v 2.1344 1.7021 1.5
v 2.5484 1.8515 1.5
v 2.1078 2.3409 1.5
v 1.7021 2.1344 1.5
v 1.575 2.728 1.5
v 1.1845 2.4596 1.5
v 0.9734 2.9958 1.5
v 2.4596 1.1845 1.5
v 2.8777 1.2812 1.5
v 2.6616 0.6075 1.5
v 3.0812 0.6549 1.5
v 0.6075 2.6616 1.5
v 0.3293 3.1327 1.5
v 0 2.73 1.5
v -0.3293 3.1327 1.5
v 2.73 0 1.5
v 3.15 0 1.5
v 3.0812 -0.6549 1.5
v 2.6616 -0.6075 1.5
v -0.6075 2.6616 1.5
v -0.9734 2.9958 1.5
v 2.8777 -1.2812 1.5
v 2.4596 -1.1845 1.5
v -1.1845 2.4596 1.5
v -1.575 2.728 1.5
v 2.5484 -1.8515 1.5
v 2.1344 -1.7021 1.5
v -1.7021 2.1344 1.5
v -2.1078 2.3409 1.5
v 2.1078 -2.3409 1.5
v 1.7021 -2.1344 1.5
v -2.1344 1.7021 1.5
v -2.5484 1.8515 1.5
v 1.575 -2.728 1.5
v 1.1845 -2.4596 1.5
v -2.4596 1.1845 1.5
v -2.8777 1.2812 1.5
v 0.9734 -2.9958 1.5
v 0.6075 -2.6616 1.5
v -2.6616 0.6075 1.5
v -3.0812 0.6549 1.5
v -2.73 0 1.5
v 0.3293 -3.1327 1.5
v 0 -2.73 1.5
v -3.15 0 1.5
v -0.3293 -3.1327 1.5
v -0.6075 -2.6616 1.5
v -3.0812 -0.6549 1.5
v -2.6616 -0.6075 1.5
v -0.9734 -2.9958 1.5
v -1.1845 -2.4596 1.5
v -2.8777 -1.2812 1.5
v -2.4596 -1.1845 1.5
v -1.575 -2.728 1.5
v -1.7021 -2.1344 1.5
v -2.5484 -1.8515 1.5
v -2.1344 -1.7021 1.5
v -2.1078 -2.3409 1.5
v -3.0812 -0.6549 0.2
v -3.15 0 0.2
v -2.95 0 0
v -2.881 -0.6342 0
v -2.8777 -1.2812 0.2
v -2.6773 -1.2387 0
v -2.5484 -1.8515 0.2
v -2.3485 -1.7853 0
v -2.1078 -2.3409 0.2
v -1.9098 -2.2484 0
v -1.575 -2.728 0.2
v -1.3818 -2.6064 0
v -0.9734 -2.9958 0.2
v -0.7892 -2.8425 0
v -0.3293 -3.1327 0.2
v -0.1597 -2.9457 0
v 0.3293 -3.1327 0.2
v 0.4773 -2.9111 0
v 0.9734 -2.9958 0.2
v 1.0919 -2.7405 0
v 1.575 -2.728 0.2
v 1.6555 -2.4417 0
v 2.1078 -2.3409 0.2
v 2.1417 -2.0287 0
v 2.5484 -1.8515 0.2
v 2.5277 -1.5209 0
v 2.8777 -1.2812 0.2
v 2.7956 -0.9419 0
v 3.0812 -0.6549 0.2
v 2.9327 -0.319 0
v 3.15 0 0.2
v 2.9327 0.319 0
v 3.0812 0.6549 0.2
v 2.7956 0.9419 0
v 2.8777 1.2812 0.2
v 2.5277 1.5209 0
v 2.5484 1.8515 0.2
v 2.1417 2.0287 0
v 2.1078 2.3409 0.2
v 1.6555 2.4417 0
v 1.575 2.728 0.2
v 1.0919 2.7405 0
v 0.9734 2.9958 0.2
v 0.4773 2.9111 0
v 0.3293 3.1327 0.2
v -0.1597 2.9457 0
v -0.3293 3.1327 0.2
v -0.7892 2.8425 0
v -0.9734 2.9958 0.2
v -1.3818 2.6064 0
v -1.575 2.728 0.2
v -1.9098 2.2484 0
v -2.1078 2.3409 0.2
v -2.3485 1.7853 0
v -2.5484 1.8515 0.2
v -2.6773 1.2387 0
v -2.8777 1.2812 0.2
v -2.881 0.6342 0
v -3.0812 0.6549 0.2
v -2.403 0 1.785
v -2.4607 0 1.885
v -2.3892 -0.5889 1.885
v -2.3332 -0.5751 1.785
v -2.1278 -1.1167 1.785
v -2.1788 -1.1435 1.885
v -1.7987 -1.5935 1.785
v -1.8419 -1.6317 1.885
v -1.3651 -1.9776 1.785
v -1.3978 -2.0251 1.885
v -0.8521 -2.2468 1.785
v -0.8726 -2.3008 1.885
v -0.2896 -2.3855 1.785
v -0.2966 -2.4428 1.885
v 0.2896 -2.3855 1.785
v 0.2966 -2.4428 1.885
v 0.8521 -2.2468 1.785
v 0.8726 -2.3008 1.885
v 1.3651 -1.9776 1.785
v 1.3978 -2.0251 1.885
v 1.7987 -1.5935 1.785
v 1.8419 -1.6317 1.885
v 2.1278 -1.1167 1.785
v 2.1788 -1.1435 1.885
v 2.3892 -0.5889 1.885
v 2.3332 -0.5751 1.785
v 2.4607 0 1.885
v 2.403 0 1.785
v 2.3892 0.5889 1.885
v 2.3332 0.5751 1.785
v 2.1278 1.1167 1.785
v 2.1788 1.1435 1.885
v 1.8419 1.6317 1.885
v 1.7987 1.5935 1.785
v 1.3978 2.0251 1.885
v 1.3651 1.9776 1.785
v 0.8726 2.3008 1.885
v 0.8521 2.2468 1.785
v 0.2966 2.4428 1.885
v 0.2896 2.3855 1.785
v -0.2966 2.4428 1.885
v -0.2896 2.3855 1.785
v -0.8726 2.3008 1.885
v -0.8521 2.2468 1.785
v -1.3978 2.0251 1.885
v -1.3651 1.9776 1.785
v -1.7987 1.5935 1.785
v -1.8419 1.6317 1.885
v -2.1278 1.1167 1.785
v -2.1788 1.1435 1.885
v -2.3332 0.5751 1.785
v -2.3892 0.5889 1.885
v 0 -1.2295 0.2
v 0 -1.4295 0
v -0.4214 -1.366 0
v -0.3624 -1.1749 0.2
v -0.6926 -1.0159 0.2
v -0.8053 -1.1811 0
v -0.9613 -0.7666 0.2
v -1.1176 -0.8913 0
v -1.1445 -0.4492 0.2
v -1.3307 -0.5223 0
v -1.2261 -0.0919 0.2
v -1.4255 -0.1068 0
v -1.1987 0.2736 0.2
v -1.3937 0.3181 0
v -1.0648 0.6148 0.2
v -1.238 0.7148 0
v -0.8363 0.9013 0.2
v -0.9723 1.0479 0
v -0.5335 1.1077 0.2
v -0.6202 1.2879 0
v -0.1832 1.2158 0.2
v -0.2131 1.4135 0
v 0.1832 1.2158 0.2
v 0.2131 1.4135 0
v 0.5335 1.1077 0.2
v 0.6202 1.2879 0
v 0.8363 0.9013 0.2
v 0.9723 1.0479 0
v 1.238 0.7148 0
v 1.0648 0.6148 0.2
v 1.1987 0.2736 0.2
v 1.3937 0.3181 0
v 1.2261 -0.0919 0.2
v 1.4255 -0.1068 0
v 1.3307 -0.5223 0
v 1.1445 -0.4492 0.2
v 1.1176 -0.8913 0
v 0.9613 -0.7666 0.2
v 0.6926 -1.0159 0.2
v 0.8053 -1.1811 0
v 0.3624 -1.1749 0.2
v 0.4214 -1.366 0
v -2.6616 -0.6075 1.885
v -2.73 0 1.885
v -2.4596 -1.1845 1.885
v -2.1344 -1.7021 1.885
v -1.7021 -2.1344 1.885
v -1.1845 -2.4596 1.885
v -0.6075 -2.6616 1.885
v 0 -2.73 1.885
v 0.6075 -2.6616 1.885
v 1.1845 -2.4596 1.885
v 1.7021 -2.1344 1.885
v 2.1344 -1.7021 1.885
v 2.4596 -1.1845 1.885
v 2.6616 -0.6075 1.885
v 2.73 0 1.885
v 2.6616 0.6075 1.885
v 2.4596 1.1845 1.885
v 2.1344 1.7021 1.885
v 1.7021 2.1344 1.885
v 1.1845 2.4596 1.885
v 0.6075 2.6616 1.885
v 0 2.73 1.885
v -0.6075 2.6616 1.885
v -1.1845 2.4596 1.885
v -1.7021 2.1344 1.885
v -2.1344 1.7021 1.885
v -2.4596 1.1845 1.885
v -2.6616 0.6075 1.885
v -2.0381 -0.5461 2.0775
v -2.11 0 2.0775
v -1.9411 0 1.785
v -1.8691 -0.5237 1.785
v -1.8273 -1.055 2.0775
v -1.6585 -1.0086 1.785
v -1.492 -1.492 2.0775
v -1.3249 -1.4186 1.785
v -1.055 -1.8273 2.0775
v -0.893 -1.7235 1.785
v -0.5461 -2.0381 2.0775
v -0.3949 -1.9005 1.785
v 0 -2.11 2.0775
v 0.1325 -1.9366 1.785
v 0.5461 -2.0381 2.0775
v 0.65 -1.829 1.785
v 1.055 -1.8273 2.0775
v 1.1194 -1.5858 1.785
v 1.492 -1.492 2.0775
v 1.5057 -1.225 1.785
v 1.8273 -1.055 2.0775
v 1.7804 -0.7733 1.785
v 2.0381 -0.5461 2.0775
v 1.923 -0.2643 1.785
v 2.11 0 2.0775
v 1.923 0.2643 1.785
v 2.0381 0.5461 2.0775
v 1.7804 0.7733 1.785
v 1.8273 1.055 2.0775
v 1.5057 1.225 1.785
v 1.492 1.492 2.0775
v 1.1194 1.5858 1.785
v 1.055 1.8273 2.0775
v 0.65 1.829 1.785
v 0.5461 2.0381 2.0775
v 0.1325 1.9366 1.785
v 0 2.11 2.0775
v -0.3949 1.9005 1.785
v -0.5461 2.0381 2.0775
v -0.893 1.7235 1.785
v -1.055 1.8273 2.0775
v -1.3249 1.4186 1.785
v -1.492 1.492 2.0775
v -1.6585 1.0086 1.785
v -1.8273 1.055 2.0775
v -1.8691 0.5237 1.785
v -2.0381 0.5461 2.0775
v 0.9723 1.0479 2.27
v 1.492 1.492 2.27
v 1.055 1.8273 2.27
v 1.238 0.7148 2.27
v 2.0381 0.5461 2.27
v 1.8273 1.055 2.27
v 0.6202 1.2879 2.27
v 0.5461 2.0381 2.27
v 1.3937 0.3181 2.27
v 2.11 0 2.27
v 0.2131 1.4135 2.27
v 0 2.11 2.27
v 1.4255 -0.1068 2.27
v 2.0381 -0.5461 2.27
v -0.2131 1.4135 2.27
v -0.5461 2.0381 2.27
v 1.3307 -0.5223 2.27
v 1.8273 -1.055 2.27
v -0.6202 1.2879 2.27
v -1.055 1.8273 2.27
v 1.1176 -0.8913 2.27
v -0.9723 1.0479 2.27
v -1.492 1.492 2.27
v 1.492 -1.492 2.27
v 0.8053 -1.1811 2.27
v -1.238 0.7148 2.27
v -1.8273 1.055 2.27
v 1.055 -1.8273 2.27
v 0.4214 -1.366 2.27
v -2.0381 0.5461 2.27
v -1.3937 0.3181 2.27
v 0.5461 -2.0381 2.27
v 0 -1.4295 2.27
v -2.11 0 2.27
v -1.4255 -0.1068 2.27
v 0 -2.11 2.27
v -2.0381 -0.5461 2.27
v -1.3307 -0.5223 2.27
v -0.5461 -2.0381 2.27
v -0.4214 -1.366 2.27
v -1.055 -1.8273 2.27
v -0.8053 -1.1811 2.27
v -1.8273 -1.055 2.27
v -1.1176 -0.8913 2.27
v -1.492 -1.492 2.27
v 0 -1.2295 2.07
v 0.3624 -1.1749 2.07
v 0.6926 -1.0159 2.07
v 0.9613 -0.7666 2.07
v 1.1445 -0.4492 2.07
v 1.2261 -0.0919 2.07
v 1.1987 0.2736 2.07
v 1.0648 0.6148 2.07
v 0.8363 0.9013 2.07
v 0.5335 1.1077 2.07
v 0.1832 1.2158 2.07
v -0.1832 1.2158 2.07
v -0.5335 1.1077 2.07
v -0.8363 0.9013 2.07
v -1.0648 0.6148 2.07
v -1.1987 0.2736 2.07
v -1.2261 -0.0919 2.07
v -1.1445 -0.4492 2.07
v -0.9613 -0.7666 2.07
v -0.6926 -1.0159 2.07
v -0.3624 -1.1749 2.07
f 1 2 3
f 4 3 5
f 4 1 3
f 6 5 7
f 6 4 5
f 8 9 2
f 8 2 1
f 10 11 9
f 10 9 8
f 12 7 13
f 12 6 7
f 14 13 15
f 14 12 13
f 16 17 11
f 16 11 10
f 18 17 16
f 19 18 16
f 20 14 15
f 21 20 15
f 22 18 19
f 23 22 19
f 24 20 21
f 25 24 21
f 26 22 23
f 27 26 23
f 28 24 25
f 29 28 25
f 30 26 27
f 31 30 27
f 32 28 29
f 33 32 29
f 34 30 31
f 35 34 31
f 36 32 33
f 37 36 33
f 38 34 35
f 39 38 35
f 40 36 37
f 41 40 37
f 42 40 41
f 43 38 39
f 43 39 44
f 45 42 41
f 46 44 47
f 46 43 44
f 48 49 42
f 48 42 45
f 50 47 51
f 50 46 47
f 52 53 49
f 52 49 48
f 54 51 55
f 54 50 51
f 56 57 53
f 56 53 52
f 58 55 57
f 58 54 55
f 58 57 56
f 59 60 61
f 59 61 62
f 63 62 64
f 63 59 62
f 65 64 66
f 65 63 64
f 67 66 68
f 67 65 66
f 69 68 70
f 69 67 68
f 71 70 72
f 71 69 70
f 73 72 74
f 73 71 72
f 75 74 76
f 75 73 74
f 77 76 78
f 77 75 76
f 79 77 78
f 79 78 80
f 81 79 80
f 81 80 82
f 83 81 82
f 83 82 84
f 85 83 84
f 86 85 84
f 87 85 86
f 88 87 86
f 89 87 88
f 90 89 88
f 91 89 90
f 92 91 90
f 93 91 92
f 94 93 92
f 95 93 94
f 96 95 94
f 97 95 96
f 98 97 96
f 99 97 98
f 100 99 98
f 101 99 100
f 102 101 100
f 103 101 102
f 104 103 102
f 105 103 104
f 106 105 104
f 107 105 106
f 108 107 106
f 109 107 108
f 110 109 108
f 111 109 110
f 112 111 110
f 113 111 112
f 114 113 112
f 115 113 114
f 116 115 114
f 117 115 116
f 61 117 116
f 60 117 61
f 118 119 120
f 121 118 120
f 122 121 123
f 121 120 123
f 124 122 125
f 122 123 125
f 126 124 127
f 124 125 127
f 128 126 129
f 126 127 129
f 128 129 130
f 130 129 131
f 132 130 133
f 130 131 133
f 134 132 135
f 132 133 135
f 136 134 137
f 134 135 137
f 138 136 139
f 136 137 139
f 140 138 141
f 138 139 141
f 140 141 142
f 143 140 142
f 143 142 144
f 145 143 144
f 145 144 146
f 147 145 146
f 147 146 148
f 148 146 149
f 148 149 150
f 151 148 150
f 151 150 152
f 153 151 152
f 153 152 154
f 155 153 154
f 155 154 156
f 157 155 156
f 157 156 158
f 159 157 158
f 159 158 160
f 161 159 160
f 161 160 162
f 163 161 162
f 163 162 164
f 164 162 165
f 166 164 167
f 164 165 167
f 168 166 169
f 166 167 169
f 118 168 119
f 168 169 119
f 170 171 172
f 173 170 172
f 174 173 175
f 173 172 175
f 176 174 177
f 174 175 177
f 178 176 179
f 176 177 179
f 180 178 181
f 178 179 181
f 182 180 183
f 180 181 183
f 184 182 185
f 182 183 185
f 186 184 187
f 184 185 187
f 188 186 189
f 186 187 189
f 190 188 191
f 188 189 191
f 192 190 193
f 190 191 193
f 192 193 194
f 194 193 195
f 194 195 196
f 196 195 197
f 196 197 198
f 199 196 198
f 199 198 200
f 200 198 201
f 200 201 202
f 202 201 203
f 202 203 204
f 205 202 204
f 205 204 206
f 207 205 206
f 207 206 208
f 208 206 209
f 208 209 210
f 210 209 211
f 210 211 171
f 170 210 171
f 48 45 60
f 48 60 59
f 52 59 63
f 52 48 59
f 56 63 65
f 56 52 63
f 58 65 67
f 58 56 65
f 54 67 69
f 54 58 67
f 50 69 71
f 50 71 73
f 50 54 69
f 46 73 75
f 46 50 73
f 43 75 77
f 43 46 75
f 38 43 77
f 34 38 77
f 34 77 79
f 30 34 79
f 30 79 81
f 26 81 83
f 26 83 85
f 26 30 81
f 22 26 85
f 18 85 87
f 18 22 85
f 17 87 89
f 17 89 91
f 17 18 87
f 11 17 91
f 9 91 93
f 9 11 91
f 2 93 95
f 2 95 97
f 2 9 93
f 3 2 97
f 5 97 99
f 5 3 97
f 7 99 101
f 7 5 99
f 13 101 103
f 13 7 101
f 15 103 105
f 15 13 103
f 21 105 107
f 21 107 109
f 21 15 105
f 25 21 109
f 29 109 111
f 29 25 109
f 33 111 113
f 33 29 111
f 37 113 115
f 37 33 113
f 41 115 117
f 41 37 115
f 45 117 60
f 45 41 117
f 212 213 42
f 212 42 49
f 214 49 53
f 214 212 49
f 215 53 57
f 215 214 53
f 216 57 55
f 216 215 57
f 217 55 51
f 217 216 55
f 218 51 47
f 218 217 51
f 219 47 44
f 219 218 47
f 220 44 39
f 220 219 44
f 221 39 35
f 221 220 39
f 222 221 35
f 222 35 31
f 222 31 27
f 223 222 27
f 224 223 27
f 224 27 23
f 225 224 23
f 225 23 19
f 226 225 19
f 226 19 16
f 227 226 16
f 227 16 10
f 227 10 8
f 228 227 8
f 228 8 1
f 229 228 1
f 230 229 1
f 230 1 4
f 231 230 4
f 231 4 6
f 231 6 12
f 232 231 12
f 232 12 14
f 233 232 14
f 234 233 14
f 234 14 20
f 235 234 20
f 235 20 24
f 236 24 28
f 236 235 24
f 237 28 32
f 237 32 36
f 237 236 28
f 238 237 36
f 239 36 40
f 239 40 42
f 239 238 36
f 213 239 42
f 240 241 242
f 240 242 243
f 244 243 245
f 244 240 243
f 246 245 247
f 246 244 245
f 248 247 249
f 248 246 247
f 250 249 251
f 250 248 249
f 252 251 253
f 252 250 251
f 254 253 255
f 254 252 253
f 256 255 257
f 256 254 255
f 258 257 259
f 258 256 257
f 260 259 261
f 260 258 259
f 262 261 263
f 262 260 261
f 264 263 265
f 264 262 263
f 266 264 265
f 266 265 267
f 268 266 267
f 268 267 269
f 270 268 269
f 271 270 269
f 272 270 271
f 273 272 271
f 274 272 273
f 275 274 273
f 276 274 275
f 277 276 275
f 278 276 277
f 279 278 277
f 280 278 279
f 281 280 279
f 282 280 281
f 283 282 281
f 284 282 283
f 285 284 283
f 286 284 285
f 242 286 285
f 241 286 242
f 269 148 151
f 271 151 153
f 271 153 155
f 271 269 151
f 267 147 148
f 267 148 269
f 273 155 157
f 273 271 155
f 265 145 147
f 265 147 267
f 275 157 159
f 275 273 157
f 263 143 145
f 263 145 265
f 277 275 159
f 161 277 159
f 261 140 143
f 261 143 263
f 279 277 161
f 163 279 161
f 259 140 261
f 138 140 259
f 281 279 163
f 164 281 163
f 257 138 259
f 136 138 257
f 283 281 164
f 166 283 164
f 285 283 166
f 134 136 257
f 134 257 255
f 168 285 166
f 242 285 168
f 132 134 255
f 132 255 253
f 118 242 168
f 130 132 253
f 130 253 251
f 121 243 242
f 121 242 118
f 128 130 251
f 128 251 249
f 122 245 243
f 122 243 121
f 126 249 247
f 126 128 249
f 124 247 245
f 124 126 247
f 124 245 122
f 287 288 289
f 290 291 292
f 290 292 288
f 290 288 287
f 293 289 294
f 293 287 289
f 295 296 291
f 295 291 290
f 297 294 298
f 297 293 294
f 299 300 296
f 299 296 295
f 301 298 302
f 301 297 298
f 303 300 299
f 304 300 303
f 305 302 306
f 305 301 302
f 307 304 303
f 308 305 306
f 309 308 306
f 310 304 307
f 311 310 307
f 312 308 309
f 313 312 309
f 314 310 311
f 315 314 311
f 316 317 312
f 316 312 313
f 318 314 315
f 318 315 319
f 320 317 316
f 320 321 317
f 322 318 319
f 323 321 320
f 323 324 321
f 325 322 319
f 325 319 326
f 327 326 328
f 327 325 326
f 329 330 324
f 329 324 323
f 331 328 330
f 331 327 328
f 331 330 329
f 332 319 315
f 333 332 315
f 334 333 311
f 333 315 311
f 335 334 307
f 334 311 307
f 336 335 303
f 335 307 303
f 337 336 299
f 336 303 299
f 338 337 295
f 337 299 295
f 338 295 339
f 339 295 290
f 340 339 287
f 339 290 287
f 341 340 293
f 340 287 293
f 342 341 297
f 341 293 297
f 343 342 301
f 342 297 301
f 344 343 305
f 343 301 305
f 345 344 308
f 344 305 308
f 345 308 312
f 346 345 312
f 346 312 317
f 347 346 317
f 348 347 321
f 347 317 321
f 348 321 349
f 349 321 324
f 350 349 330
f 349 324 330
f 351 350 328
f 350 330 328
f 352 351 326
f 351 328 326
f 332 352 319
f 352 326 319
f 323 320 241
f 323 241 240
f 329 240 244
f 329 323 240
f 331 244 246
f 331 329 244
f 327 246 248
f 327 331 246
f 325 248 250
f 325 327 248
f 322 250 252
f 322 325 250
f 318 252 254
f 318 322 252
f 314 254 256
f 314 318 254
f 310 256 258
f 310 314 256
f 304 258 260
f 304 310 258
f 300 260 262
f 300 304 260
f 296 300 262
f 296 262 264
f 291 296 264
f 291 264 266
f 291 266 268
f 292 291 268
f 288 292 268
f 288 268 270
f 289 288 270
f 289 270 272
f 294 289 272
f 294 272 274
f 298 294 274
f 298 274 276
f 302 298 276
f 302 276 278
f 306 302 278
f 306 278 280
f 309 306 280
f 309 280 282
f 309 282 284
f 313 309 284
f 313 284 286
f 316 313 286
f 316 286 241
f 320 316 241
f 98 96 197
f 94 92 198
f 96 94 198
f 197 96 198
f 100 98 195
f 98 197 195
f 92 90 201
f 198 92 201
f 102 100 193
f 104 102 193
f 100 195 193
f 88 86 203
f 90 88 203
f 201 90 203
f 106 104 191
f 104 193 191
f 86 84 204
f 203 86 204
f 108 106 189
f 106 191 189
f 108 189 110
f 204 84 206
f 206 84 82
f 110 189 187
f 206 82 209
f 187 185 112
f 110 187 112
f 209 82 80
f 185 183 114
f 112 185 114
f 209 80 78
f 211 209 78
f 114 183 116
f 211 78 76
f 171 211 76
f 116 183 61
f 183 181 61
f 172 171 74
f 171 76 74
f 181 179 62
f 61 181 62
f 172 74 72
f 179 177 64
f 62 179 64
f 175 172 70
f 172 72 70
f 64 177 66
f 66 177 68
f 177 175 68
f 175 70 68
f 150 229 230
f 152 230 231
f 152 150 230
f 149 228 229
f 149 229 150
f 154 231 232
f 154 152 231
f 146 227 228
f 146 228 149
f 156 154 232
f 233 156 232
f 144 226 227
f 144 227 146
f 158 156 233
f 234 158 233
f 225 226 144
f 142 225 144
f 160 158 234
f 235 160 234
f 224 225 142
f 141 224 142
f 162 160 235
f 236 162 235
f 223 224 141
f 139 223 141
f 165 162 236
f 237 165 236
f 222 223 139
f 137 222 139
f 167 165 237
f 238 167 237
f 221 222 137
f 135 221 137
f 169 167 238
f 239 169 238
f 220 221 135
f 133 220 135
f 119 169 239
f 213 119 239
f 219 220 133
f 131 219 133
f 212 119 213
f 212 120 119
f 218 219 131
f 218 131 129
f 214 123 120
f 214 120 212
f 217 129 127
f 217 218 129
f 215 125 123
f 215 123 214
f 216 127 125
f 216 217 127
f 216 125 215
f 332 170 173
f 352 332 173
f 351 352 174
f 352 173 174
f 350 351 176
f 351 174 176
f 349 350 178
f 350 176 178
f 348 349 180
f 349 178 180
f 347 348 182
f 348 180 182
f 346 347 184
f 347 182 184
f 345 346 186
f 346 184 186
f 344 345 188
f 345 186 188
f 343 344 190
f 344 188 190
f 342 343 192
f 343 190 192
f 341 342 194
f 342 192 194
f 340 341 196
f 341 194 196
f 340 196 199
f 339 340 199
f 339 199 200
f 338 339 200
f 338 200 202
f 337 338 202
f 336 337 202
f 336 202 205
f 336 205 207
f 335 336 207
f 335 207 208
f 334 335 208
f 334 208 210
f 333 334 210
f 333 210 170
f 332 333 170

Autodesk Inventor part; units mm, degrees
ref_plane "YZ Plane" through (0, 0, 0) normal (1, 0, 0) x (0, 1, 0)
ref_plane "XZ Plane" through (0, 0, 0) normal (0, 1, 0) x (-1, 0, 0)
ref_plane "XY Plane" through (0, 0, 0) normal (0, 0, 1) x (1, 0, 0)
sketch "Sketch2" plane through (0, 0, 0) normal (0, 1, 0) x (-1, 0, 0)
  line L0 (0, 0) -> (0, 2.27)
  line L1 (0, 0) -> (3.15, 0)
  line L2 (3.15, 0) -> (3.15, 1.5)
  line L3 (3.15, 1.5) -> (2.73, 1.5)
  line L4 (2.73, 1.5) -> (2.73, 1.885)
  line L5 (2.73, 1.885) -> (2.4607, 1.885)
  line L6 (2.11, 2.0775) -> (2.11, 2.27)
  line L7 (2.11, 2.27) -> (0, 2.27)
  line L8 (2.11, 2.0775) -> (1.9411, 1.785)
  line L9 (1.9411, 1.785) -> (2.403, 1.785)
  line L10 (2.403, 1.785) -> (2.4607, 1.885)
  dimension "d0" = 1.5
  dimension "d1" = 0.77
  dimension "d2" = 4.22
  dimension "d3" = 6.3
  dimension "d17" = 0.385
  dimension "d18" = 5.46
  dimension "d19" = 0.1925
  dimension "d20" = 30
  dimension "d21" = 0.1
  dimension "d23" = 0.4
revolve "Obrót1" add sketch "Sketch2" angle 360 about axis through (0, 0, 0) along (0, 0, 1)
hole "Otwór1" at (0, 0, 2.27) direction (0, 0, -1) diameter 2.459 end through all thread size "M3x0.5" class "6H" standard "ANSI Metric M Profile"
chamfer "Faza1" distance 0.2 angle 45 3 edges at (0, 1.2295, 0) (3.15, 0, 0) (0, 1.2295, 2.27)
equation "\"d14\" = C1"
equation "\"d0\" = T_"
equation "\"d1\" = A_"
equation "\"d2\" = C_"
equation "\"d3\" = E_"
equation "\"d17\" = 0.5 * A_"
equation "\"d19\" = 0.25 * A_"
equation "\"A_\" = 0.77"
equation "\"C_\" = 4.22"
equation "\"E_\" = 6.3"
equation "\"T_\" = 1.5"
equation "\"K_\" = 0.2"
equation "\"C1\" = 0.2"
equation "\"Min_Dist\" = 4.8"
equation "\"H_Size\" = 4.25"
equation "\"Min_Thick\" = 0.8"
equation "\"NND\" = 3"
equation "\"Height\" = 2.27"
properties part number "S-M3-0 ZI" material "Stal, węglowa"
